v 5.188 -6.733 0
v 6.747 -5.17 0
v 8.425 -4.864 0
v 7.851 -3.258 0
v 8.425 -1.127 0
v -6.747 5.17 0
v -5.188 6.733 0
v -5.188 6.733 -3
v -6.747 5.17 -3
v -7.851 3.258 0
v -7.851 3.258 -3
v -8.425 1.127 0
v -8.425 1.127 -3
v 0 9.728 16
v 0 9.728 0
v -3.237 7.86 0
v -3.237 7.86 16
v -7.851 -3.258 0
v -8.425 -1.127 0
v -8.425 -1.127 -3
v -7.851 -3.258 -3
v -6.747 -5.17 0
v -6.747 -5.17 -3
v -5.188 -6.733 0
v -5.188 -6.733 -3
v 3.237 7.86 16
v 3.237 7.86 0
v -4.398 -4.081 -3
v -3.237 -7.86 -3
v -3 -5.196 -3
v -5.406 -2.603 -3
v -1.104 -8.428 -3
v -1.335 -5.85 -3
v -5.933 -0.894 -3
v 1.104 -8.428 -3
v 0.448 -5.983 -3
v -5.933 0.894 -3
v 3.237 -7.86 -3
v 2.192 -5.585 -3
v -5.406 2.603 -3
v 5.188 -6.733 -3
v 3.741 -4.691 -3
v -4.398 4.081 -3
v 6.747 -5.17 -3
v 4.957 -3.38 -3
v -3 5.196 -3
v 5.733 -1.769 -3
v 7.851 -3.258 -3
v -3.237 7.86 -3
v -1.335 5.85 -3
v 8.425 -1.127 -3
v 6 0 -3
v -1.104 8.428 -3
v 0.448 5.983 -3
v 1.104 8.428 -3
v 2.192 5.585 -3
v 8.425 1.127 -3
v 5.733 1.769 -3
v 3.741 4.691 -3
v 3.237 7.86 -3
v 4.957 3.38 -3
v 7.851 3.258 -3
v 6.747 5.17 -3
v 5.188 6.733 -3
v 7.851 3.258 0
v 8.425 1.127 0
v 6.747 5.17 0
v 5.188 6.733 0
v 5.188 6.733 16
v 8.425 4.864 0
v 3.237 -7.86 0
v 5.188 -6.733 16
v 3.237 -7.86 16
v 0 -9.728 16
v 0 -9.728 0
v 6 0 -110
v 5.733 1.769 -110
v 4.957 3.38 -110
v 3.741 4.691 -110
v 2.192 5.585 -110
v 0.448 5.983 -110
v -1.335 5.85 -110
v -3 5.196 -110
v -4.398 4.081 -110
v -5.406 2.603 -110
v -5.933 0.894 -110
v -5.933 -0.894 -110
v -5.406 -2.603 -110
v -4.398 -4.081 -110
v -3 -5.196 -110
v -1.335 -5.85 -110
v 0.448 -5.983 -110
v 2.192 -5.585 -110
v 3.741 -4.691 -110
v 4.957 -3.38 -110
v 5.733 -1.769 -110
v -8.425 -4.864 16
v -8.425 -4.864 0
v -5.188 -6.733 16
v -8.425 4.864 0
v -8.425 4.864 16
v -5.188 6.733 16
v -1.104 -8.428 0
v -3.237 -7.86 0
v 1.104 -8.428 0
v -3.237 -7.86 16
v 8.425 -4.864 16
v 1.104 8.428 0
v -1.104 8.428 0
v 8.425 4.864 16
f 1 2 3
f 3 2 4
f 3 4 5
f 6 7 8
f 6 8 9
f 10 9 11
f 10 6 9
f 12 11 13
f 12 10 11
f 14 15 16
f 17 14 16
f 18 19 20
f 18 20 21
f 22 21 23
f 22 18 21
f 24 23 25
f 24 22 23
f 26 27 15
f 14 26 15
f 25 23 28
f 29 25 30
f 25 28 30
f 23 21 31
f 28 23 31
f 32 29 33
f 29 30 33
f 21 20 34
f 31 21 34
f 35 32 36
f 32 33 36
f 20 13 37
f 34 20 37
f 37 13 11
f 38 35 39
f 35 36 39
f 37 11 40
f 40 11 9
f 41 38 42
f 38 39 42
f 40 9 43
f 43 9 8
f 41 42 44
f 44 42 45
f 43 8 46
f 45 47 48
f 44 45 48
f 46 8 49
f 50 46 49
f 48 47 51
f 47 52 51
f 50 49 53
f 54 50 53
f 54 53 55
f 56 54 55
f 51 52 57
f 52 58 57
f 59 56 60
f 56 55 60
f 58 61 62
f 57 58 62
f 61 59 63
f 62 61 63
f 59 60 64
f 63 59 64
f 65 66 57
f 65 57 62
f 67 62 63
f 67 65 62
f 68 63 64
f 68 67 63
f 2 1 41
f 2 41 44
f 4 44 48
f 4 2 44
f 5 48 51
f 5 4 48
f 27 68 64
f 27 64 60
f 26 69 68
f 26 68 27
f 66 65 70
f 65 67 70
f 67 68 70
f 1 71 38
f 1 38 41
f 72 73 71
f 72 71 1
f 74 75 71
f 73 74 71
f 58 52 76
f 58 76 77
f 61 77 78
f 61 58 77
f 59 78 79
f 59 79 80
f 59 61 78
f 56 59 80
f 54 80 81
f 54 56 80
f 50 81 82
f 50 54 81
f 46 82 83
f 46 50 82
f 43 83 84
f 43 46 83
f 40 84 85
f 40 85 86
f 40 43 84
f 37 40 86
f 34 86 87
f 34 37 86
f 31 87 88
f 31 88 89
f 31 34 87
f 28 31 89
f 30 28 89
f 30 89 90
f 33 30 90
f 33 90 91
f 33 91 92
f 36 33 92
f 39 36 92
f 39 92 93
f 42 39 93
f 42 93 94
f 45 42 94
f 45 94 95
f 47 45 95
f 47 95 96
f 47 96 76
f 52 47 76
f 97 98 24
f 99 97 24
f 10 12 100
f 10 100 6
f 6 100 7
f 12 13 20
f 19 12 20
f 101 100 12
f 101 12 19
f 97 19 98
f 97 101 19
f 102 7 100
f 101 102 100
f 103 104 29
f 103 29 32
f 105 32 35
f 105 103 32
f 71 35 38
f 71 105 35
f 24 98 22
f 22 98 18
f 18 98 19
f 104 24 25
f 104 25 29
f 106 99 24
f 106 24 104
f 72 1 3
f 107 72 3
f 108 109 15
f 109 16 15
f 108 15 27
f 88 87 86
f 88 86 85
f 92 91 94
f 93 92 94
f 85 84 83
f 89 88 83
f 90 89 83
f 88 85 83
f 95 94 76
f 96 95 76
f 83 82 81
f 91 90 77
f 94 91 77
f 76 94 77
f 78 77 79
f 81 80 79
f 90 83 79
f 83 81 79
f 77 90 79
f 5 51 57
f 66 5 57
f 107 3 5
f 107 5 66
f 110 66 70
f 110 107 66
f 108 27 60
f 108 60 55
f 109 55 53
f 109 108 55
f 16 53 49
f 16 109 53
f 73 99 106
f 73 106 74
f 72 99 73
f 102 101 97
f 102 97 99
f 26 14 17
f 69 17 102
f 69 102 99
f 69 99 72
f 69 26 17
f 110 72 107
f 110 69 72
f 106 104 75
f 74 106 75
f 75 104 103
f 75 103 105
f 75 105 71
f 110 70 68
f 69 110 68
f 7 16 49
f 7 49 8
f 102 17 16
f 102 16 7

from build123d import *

# Parameters (mm, degrees)
F0_R     = 6
F1_DEPTH = 16
F2_DEPTH = 3
F3_DEPTH = 110


with BuildPart() as f1:
    # F0 (on Top) → F1 (new body)
    with BuildSketch(Plane.XY):
        with BuildLine():
            Line((8.425, -1.1266654339), (8.425, 1.1266654339))
            ThreePointArc((8.425, 1.1266654339), (7.3612159322, 4.25), (5.1882208873, 6.7329313099))
            Line((5.1882208873, 6.7329313099), (3.2367791127, 7.8595967438))
            ThreePointArc((3.2367791127, 7.8595967438), (0, 8.5), (-3.2367791127, 7.8595967438))
            Line((-3.2367791127, 7.8595967438), (-5.1882208873, 6.7329313099))
            ThreePointArc((-5.1882208873, 6.7329313099), (-7.3612159322, 4.25), (-8.425, 1.1266654339))
            Line((-8.425, 1.1266654339), (-8.425, -1.1266654339))
            ThreePointArc((-8.425, -1.1266654339), (-7.3612159322, -4.25), (-5.1882208873, -6.7329313099))
            Line((-5.1882208873, -6.7329313099), (-3.2367791127, -7.8595967438))
            ThreePointArc((-3.2367791127, -7.8595967438), (0, -8.5), (3.2367791127, -7.8595967438))
            Line((3.2367791127, -7.8595967438), (5.1882208873, -6.7329313099))
            ThreePointArc((5.1882208873, -6.7329313099), (7.3612159322, -4.25), (8.425, -1.1266654339))
        make_face()
        Circle(F0_R, mode=Mode.SUBTRACT)
        with BuildLine():
            ThreePointArc((-8.425, 1.1266654339), (-7.3612159322, 4.25), (-5.1882208873, 6.7329313099))
            Line((-5.1882208873, 6.7329313099), (-8.425, 4.8641760179))
            Line((-8.425, 4.8641760179), (-8.425, 1.1266654339))
        make_face()
        with BuildLine():
            Line((-8.425, -4.8641760179), (-5.1882208873, -6.7329313099))
            ThreePointArc((-5.1882208873, -6.7329313099), (-7.3612159322, -4.25), (-8.425, -1.1266654339))
            Line((-8.425, -1.1266654339), (-8.425, -4.8641760179))
        make_face()
        with BuildLine():
            Line((0, -9.7283520358), (3.2367791127, -7.8595967438))
            ThreePointArc((3.2367791127, -7.8595967438), (0, -8.5), (-3.2367791127, -7.8595967438))
            Line((-3.2367791127, -7.8595967438), (0, -9.7283520358))
        make_face()
        with BuildLine():
            Line((8.425, -4.8641760179), (8.425, -1.1266654339))
            ThreePointArc((8.425, -1.1266654339), (7.3612159322, -4.25), (5.1882208873, -6.7329313099))
            Line((5.1882208873, -6.7329313099), (8.425, -4.8641760179))
        make_face()
        with BuildLine():
            ThreePointArc((5.1882208873, 6.7329313099), (7.3612159322, 4.25), (8.425, 1.1266654339))
            Line((8.425, 1.1266654339), (8.425, 4.8641760179))
            Line((8.425, 4.8641760179), (5.1882208873, 6.7329313099))
        make_face()
        with BuildLine():
            ThreePointArc((-3.2367791127, 7.8595967438), (0, 8.5), (3.2367791127, 7.8595967438))
            Line((3.2367791127, 7.8595967438), (0, 9.7283520358))
            Line((0, 9.7283520358), (-3.2367791127, 7.8595967438))
        make_face()
        Circle(F0_R)
    extrude(amount=F1_DEPTH)

    # F0 (on Top) → F2 (join)
    with BuildSketch(Plane.XY):
        with BuildLine():
            Line((8.425, -1.1266654339), (8.425, 1.1266654339))
            ThreePointArc((8.425, 1.1266654339), (7.3612159322, 4.25), (5.1882208873, 6.7329313099))
            Line((5.1882208873, 6.7329313099), (3.2367791127, 7.8595967438))
            ThreePointArc((3.2367791127, 7.8595967438), (0, 8.5), (-3.2367791127, 7.8595967438))
            Line((-3.2367791127, 7.8595967438), (-5.1882208873, 6.7329313099))
            ThreePointArc((-5.1882208873, 6.7329313099), (-7.3612159322, 4.25), (-8.425, 1.1266654339))
            Line((-8.425, 1.1266654339), (-8.425, -1.1266654339))
            ThreePointArc((-8.425, -1.1266654339), (-7.3612159322, -4.25), (-5.1882208873, -6.7329313099))
            Line((-5.1882208873, -6.7329313099), (-3.2367791127, -7.8595967438))
            ThreePointArc((-3.2367791127, -7.8595967438), (0, -8.5), (3.2367791127, -7.8595967438))
            Line((3.2367791127, -7.8595967438), (5.1882208873, -6.7329313099))
            ThreePointArc((5.1882208873, -6.7329313099), (7.3612159322, -4.25), (8.425, -1.1266654339))
        make_face()
        Circle(F0_R, mode=Mode.SUBTRACT)
        Circle(F0_R)
    extrude(amount=-F2_DEPTH)

    # F0 (on Top) → F3 (join)
    with BuildSketch(Plane.XY):
        Circle(F0_R)
    extrude(amount=-F3_DEPTH)


solid = f1.part
